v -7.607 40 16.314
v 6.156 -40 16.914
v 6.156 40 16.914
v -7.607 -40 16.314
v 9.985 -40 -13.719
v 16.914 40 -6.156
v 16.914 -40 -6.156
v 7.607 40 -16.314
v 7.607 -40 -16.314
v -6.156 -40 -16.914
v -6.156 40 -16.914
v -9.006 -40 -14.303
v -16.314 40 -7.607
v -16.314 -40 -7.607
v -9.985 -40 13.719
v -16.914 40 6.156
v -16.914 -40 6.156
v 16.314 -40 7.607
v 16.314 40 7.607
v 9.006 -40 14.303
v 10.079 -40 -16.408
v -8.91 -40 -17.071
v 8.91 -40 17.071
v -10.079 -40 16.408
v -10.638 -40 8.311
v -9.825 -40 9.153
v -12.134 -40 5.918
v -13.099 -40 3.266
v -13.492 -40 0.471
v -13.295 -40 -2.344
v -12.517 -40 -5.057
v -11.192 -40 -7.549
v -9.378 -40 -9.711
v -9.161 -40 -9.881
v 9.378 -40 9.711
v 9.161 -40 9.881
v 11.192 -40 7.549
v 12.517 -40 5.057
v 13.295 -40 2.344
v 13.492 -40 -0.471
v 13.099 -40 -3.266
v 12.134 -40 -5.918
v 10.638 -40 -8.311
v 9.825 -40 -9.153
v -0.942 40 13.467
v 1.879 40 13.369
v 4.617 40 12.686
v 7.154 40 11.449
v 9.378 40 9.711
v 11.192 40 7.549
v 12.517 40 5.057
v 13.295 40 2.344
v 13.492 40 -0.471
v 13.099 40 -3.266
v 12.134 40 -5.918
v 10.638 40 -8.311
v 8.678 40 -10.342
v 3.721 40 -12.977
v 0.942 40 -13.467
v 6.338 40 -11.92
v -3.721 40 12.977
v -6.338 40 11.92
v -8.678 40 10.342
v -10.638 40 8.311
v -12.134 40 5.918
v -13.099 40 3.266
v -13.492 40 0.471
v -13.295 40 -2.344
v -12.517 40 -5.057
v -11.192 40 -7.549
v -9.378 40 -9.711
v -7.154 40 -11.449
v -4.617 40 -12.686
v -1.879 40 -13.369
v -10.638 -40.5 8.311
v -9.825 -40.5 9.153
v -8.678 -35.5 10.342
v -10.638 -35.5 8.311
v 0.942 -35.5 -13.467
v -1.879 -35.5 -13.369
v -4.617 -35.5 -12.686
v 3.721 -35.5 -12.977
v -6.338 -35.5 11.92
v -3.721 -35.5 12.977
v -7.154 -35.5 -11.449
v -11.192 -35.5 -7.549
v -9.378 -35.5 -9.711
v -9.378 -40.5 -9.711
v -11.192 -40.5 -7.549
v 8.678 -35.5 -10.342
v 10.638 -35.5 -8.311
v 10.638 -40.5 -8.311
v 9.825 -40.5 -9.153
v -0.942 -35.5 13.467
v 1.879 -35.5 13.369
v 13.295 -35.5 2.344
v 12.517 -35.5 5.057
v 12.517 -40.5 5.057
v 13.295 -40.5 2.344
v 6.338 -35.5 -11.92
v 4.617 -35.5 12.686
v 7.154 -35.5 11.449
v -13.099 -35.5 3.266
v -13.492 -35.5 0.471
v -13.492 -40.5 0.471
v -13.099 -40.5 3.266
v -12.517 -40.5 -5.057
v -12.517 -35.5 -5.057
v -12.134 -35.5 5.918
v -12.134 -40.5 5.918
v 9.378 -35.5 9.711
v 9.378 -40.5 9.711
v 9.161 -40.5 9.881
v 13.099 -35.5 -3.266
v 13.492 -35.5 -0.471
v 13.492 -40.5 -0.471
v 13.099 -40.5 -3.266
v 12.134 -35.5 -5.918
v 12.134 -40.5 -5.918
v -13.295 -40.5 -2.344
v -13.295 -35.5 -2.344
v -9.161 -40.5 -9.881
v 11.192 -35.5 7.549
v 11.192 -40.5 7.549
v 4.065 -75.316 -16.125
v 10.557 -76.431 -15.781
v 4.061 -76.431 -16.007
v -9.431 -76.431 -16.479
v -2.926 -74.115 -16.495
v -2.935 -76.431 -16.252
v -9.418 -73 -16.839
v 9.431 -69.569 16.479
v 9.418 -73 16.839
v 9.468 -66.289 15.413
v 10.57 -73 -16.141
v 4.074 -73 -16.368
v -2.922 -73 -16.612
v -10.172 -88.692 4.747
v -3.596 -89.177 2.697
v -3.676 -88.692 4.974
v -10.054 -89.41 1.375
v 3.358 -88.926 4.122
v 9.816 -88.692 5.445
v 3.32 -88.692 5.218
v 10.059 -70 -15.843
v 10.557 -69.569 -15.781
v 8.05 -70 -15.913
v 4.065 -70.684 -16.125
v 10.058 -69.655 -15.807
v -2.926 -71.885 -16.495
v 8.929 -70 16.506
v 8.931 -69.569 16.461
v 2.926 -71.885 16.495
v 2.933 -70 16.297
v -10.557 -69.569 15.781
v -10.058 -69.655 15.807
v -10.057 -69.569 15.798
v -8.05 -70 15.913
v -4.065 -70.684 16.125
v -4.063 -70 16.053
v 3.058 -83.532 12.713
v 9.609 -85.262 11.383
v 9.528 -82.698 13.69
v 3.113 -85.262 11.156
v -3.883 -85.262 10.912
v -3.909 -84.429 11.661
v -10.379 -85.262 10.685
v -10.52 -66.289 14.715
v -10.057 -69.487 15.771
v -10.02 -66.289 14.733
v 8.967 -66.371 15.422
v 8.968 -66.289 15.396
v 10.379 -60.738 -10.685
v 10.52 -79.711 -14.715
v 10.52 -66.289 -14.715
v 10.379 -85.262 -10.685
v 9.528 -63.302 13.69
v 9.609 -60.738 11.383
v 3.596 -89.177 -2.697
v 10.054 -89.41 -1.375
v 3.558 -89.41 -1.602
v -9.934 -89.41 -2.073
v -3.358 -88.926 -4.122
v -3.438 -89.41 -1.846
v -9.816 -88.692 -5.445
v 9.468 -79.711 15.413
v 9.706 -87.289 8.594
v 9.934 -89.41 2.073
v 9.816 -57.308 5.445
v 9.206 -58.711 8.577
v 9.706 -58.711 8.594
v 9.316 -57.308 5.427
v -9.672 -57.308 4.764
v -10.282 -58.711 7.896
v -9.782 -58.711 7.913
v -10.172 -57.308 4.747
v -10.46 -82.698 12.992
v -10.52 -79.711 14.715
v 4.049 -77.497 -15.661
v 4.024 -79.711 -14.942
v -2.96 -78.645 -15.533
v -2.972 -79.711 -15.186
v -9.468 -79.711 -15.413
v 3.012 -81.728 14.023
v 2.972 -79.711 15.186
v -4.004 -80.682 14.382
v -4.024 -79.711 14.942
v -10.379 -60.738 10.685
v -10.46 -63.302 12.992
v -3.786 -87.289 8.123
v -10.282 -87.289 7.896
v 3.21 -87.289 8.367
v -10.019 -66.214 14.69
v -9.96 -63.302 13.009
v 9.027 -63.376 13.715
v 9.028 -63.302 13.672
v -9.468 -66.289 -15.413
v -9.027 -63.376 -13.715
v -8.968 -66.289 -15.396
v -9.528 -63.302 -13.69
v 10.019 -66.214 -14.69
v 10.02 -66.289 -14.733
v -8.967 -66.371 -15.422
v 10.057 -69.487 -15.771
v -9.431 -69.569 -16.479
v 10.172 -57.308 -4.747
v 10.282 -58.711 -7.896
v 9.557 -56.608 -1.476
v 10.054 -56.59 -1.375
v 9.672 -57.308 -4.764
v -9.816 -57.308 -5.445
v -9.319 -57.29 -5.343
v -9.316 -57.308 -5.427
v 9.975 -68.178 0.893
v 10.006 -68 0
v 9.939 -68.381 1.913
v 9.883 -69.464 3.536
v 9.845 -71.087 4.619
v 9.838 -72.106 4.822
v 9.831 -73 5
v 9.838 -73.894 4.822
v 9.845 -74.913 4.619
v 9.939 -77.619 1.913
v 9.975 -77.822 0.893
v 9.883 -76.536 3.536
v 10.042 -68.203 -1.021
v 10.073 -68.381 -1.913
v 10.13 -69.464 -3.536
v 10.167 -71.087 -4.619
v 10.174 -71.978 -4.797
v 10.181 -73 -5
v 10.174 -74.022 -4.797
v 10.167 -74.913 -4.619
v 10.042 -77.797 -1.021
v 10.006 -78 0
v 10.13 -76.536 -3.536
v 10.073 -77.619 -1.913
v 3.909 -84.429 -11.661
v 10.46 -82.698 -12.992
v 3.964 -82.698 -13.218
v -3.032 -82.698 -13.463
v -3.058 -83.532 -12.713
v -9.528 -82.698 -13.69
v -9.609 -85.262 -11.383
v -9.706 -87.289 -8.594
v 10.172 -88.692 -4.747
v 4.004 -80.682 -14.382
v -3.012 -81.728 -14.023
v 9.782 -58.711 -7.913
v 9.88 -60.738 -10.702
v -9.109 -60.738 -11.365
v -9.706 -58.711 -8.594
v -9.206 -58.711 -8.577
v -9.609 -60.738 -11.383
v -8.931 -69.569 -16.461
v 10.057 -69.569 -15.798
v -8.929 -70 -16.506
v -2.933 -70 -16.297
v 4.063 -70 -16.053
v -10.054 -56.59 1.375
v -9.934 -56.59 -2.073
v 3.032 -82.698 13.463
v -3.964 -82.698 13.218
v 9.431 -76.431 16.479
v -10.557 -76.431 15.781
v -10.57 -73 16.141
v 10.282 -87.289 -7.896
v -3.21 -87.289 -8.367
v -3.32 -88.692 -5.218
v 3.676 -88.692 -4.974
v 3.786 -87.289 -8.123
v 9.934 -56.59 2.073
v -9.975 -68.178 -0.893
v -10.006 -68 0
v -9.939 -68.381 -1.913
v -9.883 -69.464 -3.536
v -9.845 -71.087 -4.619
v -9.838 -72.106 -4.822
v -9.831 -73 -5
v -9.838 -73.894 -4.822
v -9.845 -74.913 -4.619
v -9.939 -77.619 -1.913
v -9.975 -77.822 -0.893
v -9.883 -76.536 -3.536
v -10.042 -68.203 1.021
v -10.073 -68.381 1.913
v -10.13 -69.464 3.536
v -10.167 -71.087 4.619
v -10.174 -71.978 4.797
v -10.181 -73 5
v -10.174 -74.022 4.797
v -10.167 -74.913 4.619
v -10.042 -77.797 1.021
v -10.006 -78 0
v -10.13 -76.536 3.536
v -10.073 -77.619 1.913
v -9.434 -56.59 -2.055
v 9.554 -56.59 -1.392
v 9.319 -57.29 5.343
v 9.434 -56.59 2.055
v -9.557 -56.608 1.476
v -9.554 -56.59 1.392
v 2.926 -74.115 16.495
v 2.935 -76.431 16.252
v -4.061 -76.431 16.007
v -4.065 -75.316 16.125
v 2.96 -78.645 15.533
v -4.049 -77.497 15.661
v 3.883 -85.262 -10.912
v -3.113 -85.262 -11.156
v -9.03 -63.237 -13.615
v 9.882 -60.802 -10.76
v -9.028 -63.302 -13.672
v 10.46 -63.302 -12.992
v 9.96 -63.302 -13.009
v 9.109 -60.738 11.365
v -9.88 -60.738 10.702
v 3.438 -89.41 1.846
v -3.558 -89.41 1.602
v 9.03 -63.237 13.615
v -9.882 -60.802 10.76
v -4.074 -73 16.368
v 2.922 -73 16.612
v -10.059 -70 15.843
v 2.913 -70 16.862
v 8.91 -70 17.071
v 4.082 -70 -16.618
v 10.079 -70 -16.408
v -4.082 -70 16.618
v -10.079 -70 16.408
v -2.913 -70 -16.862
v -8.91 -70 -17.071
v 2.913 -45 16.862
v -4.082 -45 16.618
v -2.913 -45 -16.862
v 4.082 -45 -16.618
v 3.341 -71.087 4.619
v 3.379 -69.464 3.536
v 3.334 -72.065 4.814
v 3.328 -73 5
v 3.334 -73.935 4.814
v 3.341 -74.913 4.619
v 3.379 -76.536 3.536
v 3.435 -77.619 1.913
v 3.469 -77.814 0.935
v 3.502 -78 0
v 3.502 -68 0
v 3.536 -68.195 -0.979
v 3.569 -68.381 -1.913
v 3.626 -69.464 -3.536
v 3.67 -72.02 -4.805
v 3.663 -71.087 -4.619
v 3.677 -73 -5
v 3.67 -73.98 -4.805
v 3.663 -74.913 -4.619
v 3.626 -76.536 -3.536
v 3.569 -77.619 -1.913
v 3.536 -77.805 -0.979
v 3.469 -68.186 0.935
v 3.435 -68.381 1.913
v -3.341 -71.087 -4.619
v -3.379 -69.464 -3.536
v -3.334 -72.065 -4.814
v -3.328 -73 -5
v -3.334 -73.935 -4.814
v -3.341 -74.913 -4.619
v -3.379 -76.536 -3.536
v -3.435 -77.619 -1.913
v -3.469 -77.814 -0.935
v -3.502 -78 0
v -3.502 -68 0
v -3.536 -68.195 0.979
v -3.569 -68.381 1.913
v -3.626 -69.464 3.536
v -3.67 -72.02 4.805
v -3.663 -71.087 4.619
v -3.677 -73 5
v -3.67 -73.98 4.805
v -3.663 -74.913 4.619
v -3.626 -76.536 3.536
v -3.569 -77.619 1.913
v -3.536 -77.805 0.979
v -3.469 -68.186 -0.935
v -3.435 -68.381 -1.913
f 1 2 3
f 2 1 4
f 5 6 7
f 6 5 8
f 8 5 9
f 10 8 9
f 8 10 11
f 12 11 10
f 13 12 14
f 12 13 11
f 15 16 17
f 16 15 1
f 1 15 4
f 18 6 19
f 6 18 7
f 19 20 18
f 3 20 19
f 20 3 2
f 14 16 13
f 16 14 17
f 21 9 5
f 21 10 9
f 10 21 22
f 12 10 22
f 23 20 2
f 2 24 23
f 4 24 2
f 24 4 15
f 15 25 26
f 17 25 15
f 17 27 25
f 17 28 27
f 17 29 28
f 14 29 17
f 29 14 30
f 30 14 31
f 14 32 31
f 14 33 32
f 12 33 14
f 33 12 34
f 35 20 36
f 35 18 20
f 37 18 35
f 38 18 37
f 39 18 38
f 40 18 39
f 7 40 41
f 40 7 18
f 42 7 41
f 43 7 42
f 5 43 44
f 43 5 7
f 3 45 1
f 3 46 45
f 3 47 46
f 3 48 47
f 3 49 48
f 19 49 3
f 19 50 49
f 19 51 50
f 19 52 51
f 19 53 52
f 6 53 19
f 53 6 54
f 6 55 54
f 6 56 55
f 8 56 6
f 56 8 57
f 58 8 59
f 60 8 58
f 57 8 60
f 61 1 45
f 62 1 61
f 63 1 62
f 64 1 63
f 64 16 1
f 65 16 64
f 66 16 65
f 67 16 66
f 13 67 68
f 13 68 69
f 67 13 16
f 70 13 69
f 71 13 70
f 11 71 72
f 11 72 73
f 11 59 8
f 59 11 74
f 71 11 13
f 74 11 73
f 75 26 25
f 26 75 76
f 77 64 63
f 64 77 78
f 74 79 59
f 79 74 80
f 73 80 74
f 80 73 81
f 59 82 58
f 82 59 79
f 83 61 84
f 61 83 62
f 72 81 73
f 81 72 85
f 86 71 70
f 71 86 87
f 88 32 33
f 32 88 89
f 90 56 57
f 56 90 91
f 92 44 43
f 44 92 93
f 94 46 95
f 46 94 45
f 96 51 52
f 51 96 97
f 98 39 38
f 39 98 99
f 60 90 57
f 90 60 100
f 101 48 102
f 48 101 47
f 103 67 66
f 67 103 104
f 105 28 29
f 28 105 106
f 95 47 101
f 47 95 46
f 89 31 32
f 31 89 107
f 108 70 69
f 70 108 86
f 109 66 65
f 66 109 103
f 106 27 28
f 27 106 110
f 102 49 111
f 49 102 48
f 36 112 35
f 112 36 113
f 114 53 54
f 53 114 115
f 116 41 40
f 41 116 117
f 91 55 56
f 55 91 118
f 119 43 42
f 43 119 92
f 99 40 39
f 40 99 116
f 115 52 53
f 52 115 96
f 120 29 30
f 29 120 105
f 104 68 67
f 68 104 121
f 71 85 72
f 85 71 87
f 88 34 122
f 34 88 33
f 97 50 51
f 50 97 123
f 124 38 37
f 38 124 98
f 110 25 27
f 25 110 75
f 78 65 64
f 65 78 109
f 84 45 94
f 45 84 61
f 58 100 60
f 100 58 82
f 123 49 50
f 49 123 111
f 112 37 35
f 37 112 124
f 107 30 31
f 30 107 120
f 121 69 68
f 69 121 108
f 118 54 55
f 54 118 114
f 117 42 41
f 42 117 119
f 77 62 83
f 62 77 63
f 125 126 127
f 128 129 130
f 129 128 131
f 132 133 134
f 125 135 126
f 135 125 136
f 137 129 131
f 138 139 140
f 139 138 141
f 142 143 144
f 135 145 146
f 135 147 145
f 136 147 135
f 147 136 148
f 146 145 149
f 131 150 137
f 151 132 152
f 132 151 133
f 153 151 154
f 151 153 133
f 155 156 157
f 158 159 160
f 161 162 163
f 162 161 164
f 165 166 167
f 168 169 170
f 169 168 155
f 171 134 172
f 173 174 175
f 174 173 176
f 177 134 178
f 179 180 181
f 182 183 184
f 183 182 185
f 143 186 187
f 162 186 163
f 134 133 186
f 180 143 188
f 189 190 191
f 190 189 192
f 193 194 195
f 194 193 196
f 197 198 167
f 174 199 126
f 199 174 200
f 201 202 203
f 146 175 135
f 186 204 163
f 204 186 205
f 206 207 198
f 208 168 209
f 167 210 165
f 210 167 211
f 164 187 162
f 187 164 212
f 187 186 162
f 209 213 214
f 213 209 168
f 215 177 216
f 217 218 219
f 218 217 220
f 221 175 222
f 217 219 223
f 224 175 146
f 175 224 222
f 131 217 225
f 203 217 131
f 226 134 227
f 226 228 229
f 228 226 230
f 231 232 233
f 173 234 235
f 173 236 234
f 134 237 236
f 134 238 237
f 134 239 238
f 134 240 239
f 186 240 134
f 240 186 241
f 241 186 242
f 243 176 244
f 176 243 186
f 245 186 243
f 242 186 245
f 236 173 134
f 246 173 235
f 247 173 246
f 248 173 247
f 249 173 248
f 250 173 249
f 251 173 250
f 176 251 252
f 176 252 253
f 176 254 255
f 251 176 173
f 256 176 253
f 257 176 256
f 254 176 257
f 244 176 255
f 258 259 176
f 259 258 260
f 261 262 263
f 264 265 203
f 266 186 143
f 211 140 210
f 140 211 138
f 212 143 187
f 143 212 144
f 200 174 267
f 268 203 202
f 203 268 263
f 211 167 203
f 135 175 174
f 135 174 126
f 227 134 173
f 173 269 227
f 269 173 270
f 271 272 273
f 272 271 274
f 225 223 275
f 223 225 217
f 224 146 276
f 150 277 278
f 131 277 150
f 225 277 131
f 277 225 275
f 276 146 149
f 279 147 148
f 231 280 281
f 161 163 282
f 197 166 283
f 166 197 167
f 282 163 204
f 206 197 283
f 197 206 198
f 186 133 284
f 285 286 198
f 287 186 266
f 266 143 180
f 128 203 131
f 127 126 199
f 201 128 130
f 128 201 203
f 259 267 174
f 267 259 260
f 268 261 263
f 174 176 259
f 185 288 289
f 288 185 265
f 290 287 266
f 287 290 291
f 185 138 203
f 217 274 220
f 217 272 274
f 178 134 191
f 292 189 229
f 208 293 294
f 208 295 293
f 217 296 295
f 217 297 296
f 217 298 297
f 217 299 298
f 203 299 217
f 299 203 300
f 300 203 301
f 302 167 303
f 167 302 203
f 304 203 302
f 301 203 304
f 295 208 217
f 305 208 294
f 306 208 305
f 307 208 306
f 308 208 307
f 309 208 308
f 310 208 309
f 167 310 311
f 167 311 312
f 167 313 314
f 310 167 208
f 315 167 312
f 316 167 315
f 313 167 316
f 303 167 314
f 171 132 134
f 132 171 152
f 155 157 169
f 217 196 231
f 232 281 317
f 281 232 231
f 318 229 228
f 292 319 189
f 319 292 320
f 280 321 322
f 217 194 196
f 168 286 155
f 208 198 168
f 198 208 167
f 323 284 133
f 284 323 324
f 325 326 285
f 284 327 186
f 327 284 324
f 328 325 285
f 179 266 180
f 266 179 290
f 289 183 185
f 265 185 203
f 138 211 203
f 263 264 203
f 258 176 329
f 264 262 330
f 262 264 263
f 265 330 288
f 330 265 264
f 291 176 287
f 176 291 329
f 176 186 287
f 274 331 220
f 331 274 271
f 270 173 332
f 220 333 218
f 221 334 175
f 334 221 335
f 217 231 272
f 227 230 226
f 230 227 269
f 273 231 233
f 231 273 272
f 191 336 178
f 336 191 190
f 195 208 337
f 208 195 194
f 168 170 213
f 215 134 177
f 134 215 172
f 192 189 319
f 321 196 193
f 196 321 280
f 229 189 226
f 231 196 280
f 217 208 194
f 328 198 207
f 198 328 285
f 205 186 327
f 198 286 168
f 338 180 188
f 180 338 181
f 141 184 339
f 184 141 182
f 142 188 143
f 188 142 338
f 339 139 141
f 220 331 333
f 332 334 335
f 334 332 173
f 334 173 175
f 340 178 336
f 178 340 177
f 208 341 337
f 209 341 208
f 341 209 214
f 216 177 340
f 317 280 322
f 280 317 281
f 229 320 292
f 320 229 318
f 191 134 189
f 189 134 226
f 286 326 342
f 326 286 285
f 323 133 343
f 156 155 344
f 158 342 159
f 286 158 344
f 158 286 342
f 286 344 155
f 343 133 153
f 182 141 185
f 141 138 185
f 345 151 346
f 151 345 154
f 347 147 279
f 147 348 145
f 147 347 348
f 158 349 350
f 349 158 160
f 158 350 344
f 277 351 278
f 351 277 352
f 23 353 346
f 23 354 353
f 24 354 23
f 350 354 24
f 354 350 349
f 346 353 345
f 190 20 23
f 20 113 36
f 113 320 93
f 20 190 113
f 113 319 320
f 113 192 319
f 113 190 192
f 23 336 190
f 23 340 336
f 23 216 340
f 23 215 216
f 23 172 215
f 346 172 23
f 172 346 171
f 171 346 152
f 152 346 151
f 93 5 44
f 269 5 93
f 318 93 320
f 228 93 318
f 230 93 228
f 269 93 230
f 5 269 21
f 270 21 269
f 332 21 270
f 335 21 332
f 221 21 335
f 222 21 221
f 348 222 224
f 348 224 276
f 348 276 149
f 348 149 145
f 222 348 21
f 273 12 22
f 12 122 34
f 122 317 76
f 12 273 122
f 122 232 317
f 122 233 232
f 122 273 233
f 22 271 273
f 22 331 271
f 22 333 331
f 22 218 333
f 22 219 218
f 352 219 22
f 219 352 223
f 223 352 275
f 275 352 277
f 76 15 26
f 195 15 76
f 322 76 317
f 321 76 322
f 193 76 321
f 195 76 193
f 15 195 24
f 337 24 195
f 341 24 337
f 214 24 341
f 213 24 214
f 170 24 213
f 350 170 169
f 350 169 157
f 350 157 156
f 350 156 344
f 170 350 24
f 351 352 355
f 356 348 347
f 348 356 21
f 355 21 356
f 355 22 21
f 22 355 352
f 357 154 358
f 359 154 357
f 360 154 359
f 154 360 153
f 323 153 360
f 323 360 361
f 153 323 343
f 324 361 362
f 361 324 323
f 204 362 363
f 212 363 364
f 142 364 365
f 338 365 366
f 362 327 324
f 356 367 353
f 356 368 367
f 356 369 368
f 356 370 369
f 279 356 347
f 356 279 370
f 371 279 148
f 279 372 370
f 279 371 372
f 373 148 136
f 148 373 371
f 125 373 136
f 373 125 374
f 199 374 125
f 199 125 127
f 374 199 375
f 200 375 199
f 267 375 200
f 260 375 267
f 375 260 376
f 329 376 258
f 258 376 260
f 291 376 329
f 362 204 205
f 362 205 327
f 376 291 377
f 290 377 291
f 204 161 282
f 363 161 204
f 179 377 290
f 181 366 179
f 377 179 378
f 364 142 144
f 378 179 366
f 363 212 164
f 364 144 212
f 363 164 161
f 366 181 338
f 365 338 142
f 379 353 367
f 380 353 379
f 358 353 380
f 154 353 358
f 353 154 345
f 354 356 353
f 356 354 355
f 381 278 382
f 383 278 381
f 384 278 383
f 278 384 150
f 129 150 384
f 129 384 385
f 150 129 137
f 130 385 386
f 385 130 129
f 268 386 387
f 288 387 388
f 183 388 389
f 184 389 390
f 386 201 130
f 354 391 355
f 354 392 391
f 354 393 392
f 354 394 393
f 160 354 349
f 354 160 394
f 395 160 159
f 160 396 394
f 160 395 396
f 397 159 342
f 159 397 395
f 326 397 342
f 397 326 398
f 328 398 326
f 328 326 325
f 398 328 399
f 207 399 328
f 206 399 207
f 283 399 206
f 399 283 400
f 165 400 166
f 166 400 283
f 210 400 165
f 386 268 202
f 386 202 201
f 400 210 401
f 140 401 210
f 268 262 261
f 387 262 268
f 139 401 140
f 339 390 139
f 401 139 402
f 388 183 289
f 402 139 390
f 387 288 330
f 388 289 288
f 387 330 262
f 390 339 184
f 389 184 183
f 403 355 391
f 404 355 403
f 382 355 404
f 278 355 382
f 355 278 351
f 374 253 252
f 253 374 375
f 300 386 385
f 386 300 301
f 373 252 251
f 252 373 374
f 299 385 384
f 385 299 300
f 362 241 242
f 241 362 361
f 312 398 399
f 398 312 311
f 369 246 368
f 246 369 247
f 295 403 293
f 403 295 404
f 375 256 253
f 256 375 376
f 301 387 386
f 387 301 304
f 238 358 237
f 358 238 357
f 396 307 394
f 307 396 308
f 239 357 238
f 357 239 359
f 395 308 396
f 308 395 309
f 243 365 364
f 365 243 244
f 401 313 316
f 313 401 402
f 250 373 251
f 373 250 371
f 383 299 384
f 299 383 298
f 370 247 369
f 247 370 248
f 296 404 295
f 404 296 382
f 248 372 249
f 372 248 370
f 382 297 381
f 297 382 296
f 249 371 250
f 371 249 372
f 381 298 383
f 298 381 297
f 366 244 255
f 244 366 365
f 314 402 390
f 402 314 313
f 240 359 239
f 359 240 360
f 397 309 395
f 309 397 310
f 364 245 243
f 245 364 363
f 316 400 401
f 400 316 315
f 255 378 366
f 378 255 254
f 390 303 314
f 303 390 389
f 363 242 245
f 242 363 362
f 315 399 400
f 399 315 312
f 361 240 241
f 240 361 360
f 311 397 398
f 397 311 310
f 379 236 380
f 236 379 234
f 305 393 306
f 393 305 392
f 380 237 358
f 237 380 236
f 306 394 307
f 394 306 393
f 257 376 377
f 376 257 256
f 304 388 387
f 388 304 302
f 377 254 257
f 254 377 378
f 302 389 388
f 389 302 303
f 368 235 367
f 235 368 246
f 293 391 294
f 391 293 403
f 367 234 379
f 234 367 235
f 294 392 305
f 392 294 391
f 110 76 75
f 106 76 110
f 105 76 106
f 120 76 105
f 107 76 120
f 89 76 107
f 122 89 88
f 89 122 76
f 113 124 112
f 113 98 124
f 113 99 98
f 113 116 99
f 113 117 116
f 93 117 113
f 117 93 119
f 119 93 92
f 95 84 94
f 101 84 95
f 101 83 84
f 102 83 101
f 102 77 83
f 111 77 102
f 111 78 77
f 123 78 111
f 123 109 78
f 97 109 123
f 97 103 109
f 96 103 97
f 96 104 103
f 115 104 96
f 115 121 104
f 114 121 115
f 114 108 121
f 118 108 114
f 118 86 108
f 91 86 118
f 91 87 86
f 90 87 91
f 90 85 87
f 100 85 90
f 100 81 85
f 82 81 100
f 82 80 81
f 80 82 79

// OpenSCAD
// rotace pro tisk
rotate ([90,110,0]){

union(){
// pricteni pro zesileni podku
difference(){
 

difference(){
// odecteni stredu pro zasazeni
union (){
//pricteni pulvalce

union(){
// pricteni pulvalce

difference() {
//odecet vnitrku 6 uhelniku


union() {
// union pro zakladni 6 uhelnik pro nasazeni na tyc

translate([0,0,-40]) rotate([0,0,0]) cylinder(h=80,r=18,$fn=8);

}

cylinder(h = 80, r = 13.5, center = true);
//odecet vnitrku 6 uhelniku
}
//#translate([0,0,0])  rotate([90,0,0]) cylinder(h = 400, r = 20, center = false);

}
//////////////////
//union(){

#translate([0,0,73]) rotate ([90,0,22])cylinder(h = 20, r=16.5, center = true);
// kruh pro osazeni do civky

//translate([0,0,0]) rotate ([0,0,0]) cube(size = [70,70,70], center = true);




#translate([0,0,55]) rotate ([0,0,22]) cube(size = [33.5,19,30], center = true);
}
// pricteni krychle pro vysunuti pulkruhu
translate([0,0,90]) rotate ([0,0,22]) cube(size = [90,7,90], center = true);
// 7 je sirka mezery pro stlaceni
}

#translate([0,0,73]) rotate ([90,0,20])cylinder(h =300 , r=5, center = true);
}
#translate([0,0,38]) rotate ([0,0,0])cylinder(h = 5, r = 13.5, center = true);
// pricteni pro zesileni podku


}

}
// #
